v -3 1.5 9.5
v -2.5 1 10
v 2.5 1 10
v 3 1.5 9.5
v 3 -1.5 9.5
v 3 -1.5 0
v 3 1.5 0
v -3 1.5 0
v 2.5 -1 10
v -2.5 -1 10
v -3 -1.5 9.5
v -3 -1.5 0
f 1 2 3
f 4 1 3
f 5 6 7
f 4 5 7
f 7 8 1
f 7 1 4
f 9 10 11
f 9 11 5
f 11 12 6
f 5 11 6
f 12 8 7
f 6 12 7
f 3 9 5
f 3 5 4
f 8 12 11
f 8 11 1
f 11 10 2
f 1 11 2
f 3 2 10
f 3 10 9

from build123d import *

# Parameters (mm, degrees)
ESQUISSE1_W        = 6
ESQUISSE1_H        = 3
BOSS_EXTRU_1_DEPTH = 10
CHANFREIN1_SIZE    = 0.5


with BuildPart() as part:
    # Esquisse1 → Boss.-Extru.1 (new body)
    with BuildSketch(Plane.XY):
        Rectangle(ESQUISSE1_W, ESQUISSE1_H)
    extrude(amount=BOSS_EXTRU_1_DEPTH)

    # Chanfrein1
    chanfrein1_edges = [part.edges().sort_by_distance(p)[0] for p in [
        (3, 0, 10),
        (0, 1.5, 10),
        (-3, 0, 10),
        (0, -1.5, 10),
    ]]
    chamfer(chanfrein1_edges, length=CHANFREIN1_SIZE)


solid = part.part
